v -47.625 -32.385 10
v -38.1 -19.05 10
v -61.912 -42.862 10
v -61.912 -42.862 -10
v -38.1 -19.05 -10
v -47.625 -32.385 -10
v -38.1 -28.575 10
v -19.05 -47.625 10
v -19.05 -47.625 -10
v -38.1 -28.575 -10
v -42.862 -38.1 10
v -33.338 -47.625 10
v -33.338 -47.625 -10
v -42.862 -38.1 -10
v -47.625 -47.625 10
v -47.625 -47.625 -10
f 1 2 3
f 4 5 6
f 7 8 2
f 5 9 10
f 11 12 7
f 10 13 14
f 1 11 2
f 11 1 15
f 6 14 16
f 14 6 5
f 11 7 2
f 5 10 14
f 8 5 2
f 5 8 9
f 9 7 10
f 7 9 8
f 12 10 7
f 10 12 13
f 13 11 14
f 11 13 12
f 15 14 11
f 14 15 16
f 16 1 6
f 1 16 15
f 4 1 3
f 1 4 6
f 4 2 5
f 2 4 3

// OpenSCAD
polyhedron(
    points=[
    [-38.1, -19.05, 10],
    [-19.05, -47.625, 10],
    [-38.1, -28.575, 10],
    [-33.3375, -47.625, 10],
    [-42.8625, -38.1, 10],
    [-47.625, -47.625, 10],
    [-47.625, -32.385, 10],
    [-61.9125, -42.8625, 10],
    [-38.1, -19.05, -10],
    [-19.05, -47.625, -10],
    [-38.1, -28.575, -10],
    [-33.3375, -47.625, -10],
    [-42.8625, -38.1, -10],
    [-47.625, -47.625, -10],
    [-47.625, -32.385, -10],
    [-61.9125, -42.8625, -10],
    ],
    faces=[
        [7,0,6],
        [14,8,15],
        [0,1,2],
        [10,9,8],
        [2,3,4],
        [12,11,10],
        [6,0,4,5],
        [13,12,8,14],
        [0,2,4],
        [12,10,8],
        [0,8,9,1],
        [1,9,10,2],
        [2,10,11,3],
        [3,11,12,4],
        [4,12,13,5],
        [5,13,14,6],
        [6,14,15,7],
        [7,15,8,0],
    ]
);
